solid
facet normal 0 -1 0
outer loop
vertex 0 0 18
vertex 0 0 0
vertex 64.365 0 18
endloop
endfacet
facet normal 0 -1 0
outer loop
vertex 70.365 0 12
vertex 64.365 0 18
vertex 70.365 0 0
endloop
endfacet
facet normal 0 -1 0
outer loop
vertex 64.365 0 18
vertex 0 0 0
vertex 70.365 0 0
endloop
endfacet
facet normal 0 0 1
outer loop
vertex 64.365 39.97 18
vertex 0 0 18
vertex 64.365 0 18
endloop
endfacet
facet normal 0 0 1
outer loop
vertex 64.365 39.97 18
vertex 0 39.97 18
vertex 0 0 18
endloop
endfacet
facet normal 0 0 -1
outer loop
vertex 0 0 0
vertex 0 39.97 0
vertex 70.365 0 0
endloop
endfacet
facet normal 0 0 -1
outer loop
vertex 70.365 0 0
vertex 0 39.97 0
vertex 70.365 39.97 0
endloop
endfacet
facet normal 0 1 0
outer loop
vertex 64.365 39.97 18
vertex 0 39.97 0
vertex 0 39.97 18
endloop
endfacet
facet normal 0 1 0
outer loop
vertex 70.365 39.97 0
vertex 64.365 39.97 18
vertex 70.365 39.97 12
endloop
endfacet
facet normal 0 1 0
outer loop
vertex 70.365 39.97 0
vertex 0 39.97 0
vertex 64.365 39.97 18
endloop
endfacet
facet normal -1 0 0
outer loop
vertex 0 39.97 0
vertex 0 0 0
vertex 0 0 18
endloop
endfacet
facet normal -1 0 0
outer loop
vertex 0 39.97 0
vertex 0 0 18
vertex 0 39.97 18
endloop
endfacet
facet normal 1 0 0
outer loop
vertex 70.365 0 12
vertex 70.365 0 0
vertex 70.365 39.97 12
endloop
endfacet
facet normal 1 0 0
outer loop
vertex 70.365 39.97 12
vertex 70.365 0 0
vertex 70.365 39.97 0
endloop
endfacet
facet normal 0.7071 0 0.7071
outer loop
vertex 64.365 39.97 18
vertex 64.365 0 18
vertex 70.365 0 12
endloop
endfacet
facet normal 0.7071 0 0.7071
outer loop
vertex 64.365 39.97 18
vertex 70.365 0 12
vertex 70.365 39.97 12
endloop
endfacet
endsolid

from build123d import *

# Parameters (mm, degrees)
SKETCH_W     = 70.364738
SKETCH_H     = 39.969604
PAD_DEPTH    = 18
CHAMFER_SIZE = 6


with BuildPart() as part:
    # Sketch → Pad (new body)
    with BuildSketch(Plane.XY):
        with Locations((35.182369, 19.984802)):
            Rectangle(SKETCH_W, SKETCH_H)
    extrude(amount=PAD_DEPTH)

    # Chamfer
    chamfer_edges = [part.edges().sort_by_distance(p)[0] for p in [
        (70.364738, 19.984802, 18),
    ]]
    chamfer(chamfer_edges, length=CHAMFER_SIZE)


solid = part.part
